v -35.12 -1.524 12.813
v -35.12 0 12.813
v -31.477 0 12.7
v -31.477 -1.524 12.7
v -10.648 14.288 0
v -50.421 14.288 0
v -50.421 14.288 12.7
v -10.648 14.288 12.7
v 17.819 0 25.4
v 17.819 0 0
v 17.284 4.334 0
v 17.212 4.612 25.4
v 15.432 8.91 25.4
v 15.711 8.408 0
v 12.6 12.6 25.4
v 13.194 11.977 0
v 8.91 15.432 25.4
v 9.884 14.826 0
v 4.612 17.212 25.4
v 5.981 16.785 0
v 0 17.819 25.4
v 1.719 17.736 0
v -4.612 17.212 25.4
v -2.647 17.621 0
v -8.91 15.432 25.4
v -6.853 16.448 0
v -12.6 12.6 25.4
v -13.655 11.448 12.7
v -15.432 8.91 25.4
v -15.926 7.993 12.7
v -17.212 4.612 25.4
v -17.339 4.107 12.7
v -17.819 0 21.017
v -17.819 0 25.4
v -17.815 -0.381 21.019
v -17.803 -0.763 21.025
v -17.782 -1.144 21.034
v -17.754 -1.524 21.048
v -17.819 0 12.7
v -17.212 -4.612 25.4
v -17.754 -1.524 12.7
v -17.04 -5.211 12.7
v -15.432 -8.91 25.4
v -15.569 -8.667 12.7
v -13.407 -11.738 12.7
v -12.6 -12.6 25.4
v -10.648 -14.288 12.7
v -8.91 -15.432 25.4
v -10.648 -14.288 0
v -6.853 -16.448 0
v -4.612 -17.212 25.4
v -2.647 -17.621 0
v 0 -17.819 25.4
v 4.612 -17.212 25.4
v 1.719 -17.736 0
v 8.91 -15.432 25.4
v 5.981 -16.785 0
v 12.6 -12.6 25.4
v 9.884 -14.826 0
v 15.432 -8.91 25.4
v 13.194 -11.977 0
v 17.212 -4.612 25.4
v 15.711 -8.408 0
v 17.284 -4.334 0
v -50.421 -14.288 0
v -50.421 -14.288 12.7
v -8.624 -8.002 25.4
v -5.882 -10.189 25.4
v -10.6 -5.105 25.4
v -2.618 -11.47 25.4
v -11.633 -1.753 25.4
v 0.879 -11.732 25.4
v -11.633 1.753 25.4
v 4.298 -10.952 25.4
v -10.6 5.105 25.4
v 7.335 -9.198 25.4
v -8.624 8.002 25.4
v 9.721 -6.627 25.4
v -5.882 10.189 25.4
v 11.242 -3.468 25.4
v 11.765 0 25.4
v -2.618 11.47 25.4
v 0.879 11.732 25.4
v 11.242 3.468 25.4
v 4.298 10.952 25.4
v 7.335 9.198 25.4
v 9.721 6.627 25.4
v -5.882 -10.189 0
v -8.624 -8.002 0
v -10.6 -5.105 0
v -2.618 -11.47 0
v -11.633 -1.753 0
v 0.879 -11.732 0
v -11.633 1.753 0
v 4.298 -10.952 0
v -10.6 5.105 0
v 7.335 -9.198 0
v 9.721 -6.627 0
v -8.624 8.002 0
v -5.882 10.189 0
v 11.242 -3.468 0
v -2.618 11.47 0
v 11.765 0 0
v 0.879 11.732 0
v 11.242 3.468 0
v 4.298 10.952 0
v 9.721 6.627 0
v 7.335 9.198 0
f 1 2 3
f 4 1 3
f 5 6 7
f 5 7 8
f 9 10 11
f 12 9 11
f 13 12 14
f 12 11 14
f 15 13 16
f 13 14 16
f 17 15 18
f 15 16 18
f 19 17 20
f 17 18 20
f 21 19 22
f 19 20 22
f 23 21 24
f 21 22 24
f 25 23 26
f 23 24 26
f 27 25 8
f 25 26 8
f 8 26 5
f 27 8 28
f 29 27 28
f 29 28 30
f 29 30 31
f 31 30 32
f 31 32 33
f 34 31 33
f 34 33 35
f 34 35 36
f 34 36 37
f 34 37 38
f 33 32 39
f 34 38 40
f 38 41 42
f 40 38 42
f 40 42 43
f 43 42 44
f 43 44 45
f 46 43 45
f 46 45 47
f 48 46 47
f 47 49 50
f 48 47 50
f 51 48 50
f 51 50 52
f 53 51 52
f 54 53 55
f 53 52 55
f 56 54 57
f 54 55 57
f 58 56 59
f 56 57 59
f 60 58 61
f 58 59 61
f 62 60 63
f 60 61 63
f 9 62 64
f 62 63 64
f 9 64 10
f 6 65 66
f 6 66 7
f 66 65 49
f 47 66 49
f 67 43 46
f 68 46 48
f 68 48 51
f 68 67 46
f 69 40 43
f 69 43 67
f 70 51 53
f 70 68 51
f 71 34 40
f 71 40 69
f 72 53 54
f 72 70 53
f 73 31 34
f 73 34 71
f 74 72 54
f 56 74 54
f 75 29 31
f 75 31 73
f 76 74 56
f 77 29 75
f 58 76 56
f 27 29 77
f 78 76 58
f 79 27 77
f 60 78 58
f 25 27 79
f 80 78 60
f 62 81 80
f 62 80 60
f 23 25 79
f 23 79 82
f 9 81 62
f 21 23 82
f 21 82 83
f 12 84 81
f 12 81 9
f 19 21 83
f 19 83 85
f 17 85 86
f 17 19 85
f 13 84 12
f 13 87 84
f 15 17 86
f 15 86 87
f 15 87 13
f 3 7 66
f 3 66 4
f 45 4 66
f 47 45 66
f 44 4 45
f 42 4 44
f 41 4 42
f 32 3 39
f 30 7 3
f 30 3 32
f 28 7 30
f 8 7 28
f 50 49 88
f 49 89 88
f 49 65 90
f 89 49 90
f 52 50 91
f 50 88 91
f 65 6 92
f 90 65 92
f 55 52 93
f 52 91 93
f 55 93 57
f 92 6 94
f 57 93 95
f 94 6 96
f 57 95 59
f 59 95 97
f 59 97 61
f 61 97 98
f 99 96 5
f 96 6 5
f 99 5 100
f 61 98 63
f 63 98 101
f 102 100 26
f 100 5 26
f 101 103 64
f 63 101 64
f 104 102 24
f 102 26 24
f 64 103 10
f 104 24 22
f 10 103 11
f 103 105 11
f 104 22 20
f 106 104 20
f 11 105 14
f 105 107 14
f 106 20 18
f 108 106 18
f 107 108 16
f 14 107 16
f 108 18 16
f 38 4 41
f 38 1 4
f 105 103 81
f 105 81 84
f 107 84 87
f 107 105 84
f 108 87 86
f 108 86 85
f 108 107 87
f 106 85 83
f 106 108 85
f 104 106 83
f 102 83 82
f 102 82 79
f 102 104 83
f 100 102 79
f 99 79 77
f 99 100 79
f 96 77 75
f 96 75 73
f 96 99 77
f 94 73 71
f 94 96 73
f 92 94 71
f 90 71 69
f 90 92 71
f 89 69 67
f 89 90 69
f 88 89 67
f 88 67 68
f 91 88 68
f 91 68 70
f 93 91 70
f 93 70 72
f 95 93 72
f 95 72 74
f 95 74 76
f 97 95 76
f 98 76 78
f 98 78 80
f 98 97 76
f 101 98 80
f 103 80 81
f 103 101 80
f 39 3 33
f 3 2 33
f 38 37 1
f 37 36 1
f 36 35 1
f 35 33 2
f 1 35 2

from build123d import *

# Parameters (mm, degrees)
F0_R     = 17.819114
F1_DEPTH = 25.4
F2_W     = 50.421048
F2_H     = 28.575002
F3_DEPTH = 12.7
F4_R     = 11.764815
F5_DEPTH = 25.4
F7_DEPTH = 1.524


with BuildPart() as f1:
    # F0 (on Top) → F1 (new body)
    with BuildSketch(Plane.XY):
        Circle(F0_R)
    extrude(amount=F1_DEPTH)

    # F2 (on Top) → F3 (join)
    with BuildSketch(Plane.XY):
        with Locations((-25.210524, 0)):
            Rectangle(F2_W, F2_H)
    extrude(amount=F3_DEPTH)

    # F4 (on Top) → F5 (cut)
    with BuildSketch(Plane.XY):
        Circle(F4_R)
    extrude(amount=F5_DEPTH, mode=Mode.SUBTRACT)

    # F6 (on Front) → F7 (join)
    with BuildSketch(Plane.XZ):
        Polygon((-17.237177, 21.292984), (-35.119597, 12.812662), (-17.237177, 12.259597), align=None)
    extrude(amount=F7_DEPTH)


solid = f1.part
